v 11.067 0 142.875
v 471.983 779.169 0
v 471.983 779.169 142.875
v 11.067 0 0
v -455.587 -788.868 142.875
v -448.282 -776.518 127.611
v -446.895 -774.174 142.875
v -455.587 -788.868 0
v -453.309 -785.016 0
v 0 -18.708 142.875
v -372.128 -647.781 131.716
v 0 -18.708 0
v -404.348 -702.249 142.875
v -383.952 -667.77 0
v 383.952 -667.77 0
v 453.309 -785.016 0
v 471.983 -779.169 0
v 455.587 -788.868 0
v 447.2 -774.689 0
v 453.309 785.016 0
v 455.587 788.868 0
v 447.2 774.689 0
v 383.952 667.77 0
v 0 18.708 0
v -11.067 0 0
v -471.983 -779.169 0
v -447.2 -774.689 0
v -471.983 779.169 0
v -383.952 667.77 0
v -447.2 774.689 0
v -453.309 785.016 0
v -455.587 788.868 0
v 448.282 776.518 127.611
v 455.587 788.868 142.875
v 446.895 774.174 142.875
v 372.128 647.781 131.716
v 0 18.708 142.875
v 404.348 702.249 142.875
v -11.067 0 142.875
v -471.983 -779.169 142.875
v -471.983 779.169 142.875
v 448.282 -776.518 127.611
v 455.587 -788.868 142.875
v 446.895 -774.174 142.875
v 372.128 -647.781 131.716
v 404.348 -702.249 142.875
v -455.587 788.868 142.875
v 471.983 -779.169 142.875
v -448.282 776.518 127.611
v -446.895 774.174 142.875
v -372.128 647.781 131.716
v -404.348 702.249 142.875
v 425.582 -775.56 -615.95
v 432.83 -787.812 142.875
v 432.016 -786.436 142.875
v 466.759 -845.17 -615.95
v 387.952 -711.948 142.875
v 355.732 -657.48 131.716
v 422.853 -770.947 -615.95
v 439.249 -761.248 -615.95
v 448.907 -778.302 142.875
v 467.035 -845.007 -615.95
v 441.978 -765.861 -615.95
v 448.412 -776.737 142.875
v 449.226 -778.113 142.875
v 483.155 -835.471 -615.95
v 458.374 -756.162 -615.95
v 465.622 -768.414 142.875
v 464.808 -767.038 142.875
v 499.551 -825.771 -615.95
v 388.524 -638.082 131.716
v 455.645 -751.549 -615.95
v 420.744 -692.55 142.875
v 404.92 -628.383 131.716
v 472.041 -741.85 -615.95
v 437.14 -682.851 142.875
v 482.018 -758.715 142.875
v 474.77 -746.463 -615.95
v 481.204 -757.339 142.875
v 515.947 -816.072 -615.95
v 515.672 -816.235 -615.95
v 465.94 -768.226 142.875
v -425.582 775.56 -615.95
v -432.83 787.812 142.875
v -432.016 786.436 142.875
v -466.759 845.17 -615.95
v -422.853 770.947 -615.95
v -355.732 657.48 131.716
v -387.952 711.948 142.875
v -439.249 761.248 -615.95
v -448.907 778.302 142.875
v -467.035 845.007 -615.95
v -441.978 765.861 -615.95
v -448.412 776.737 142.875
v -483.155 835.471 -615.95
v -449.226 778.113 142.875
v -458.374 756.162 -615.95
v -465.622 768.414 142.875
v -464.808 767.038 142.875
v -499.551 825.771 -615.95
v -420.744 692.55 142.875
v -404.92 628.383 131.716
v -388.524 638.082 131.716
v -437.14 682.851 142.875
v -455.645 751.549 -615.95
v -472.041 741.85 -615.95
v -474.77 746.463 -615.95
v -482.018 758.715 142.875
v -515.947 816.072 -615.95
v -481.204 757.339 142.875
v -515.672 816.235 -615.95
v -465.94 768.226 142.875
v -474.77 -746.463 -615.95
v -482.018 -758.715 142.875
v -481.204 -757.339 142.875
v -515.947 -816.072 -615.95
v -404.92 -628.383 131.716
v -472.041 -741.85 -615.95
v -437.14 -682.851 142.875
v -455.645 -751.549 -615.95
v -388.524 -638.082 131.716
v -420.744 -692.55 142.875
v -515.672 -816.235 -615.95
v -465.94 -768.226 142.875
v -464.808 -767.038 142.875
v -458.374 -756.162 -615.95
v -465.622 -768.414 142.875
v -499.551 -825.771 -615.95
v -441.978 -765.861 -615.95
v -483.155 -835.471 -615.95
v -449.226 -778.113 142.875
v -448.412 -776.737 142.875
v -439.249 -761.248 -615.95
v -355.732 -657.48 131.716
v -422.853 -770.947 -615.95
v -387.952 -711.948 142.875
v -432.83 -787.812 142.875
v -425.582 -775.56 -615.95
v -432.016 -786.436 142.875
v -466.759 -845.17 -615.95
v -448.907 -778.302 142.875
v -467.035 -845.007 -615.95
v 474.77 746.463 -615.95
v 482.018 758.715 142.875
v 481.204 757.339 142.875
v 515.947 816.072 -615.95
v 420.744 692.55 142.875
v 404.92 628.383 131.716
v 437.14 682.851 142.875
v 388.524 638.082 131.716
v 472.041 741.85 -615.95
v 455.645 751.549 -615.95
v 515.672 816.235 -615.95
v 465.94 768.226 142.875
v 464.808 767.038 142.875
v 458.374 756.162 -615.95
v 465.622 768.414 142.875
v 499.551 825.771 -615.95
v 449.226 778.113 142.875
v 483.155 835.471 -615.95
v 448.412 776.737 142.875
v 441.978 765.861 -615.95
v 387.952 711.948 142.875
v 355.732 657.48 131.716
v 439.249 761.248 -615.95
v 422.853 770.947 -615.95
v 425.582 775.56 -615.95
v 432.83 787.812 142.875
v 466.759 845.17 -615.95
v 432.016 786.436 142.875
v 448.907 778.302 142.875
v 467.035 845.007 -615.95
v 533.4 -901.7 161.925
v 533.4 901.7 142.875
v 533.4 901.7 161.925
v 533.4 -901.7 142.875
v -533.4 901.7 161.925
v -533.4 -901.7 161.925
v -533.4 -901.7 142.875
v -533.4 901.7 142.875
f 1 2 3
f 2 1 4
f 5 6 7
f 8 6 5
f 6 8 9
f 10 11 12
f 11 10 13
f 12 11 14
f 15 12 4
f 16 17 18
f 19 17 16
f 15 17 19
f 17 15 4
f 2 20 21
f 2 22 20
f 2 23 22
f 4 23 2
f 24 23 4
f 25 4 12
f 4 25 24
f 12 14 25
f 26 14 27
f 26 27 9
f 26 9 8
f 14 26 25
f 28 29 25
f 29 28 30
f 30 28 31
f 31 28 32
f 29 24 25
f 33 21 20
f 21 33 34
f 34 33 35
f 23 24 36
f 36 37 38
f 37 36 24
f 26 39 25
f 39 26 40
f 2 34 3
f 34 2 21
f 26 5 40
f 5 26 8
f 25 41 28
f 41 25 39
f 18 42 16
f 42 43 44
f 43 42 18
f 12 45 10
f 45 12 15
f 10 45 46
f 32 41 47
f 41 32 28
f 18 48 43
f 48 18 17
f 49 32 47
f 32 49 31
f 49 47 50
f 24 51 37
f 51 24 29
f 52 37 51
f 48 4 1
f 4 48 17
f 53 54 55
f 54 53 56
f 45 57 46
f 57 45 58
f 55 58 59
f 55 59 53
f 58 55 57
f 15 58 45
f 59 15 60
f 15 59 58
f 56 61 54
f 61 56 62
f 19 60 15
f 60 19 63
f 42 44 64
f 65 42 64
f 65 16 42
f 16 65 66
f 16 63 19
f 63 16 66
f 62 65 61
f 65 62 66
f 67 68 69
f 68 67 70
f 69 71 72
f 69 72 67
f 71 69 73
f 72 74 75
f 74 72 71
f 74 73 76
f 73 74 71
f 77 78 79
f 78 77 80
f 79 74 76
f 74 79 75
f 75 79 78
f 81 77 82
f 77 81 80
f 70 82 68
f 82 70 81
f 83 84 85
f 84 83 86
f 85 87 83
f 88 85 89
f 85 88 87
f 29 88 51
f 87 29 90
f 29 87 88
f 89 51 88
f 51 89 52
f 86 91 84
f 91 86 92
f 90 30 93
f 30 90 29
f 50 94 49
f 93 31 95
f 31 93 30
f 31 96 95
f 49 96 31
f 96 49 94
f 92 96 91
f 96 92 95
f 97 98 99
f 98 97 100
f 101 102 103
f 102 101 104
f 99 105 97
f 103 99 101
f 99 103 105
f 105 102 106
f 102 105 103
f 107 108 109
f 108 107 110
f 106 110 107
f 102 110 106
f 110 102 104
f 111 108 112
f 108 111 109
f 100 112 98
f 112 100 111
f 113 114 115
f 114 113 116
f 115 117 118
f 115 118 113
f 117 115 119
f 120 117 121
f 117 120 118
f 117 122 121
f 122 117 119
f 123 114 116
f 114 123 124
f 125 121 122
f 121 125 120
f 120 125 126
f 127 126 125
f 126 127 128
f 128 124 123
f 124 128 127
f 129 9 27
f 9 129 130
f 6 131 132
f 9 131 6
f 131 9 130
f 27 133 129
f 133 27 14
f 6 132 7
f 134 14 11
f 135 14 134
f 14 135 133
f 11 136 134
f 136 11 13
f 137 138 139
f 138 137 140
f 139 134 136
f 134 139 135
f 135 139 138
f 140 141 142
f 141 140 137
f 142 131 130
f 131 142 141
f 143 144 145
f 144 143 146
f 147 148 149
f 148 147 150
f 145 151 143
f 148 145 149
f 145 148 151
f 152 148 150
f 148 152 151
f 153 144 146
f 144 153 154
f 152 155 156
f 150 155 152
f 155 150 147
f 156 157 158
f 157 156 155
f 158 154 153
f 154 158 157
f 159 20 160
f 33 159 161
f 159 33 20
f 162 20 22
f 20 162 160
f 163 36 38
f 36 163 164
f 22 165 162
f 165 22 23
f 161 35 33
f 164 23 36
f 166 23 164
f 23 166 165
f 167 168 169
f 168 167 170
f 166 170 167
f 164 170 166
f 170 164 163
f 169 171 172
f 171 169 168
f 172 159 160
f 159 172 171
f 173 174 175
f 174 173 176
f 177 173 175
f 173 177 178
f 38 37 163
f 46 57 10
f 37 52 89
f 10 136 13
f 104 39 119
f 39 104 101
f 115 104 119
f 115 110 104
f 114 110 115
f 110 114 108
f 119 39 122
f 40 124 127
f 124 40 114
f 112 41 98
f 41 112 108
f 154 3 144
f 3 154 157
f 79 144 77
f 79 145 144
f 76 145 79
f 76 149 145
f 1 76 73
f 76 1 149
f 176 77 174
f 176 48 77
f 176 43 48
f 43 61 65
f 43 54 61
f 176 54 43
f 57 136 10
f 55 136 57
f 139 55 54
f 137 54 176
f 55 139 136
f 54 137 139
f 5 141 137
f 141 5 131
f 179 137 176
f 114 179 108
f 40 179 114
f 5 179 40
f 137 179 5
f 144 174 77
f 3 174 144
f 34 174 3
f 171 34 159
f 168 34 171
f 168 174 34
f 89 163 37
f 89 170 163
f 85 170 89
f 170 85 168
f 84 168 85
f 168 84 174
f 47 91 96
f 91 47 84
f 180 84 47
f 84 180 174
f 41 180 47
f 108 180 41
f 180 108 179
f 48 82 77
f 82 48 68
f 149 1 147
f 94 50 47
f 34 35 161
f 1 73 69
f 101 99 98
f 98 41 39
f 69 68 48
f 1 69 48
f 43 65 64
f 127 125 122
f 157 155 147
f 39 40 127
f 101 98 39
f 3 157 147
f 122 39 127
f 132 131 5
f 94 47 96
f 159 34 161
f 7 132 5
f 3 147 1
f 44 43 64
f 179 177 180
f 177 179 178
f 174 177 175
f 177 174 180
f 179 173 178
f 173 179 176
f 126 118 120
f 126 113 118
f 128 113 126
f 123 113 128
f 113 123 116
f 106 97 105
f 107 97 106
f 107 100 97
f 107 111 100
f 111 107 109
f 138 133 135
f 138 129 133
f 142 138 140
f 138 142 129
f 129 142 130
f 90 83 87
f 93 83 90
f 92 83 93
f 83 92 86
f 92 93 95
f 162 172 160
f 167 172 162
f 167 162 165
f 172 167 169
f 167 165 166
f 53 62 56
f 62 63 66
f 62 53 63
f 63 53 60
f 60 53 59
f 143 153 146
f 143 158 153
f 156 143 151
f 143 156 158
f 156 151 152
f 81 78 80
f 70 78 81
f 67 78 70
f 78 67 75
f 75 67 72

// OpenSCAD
mms = 25.4;
width = 42*mms;
length= 71*mms;
thick = (3/4)*mms;
cross_depth = 6*mms;

leg_angle = 80;
leg_len = 31*mms;


module top(width, length, thick){
    color("Sienna"){
        cube([width, length, thick], center=true);
    }
}

module cross_under(width, length, depth, thick){
    cross_len = sqrt(width*width + length*length);
    cross_angle = atan(width/length);

    color("SaddleBrown"){
        translate([0,0,depth/2]){
            // cross beam 1
            rotate([0,0,-cross_angle]){
                cube([thick, cross_len, depth], center=true);
            }
            // cross beam 2
            rotate([0,0,cross_angle]){
                cube([thick, cross_len, depth], center=true);
            }
        }
    }
}

 
module taper_leg(width, length, thick, leg_angle, cross_angle, distance, offset, taper_angle=5){
    taper_amt = length*sin(taper_angle);
    rotate([0,0,cross_angle]){

    rotate([90+leg_angle, 0, 0]){
        translate([offset-thick/2, distance-width,length]){
            rotate([90,90,90]){
                linear_extrude(thick){
	                   polygon(points=[[0,0],[0,width-taper_amt],[length,width],[length,0],[0,0]]);
	               }
            }
        }
    }
    }
}
module leg_side(width, length, thick, leg_angle, cross_angle, distance, offset){
    rotate([0,0,cross_angle]){
        rotate([90+leg_angle, 0, 0]){
            translate([offset, distance-(width/2),length/2]){
                cube([thick, width, length], center = true);
            }
        }
    }
}
module leg(width, length, thick, leg_angle, cross_angle, distance){
    taper_leg(width=width, length=length, thick=thick, leg_angle=leg_angle, cross_angle=cross_angle, distance=distance, offset=-thick);
    taper_leg(width=width, length=length, thick=thick, leg_angle=leg_angle, cross_angle=cross_angle, distance=distance, offset=+ thick);

}

module base(width, length, cross_depth, leg_angle, leg_len, thick){
    // how far in will leg angle hit cross piece?
    inset = cos(leg_angle)*leg_len;
    // length of table from corner to corner.
    total_cross_len = sqrt(width*width + length*length);
    cross_len = total_cross_len - (2*inset);
    ratio = cross_len/total_cross_len;
    
    cross_under(width*ratio, length*ratio, cross_depth, thick);
 
    cross_angle = atan(width/length);

    leg(cross_depth, leg_len, thick, leg_angle, cross_angle, cross_len/2);
    leg(cross_depth, leg_len, thick, leg_angle, cross_angle-180, cross_len/2);
    leg(cross_depth, leg_len, thick, leg_angle, -cross_angle, cross_len/2);   
    leg(cross_depth, leg_len, thick, leg_angle, -cross_angle-180, cross_len/2);

    
}

module desk(){
    difference(){
        union(){
            translate([0,0,cross_depth]){
                top(width, length, thick);
            }
            base(width, length, cross_depth, leg_angle, leg_len, thick);
        }
        // cut plane to flatten bottoms of legs
        translate([0,0,-leg_len+cross_depth]){
            top(width*2, length*2, thick*2);
        }
    }
}

desk();
//taper_leg(width=6*mms, length=31*mms, thick=1*mms, leg_angle= 90, cross_angle= 45, distance= 0, offset=mms, taper_angle=5);
//leg_side(width=6*mms, length=31*mms, thick=1*mms, leg_angle= 90, cross_angle= 45, distance= 0, offset=mms);
